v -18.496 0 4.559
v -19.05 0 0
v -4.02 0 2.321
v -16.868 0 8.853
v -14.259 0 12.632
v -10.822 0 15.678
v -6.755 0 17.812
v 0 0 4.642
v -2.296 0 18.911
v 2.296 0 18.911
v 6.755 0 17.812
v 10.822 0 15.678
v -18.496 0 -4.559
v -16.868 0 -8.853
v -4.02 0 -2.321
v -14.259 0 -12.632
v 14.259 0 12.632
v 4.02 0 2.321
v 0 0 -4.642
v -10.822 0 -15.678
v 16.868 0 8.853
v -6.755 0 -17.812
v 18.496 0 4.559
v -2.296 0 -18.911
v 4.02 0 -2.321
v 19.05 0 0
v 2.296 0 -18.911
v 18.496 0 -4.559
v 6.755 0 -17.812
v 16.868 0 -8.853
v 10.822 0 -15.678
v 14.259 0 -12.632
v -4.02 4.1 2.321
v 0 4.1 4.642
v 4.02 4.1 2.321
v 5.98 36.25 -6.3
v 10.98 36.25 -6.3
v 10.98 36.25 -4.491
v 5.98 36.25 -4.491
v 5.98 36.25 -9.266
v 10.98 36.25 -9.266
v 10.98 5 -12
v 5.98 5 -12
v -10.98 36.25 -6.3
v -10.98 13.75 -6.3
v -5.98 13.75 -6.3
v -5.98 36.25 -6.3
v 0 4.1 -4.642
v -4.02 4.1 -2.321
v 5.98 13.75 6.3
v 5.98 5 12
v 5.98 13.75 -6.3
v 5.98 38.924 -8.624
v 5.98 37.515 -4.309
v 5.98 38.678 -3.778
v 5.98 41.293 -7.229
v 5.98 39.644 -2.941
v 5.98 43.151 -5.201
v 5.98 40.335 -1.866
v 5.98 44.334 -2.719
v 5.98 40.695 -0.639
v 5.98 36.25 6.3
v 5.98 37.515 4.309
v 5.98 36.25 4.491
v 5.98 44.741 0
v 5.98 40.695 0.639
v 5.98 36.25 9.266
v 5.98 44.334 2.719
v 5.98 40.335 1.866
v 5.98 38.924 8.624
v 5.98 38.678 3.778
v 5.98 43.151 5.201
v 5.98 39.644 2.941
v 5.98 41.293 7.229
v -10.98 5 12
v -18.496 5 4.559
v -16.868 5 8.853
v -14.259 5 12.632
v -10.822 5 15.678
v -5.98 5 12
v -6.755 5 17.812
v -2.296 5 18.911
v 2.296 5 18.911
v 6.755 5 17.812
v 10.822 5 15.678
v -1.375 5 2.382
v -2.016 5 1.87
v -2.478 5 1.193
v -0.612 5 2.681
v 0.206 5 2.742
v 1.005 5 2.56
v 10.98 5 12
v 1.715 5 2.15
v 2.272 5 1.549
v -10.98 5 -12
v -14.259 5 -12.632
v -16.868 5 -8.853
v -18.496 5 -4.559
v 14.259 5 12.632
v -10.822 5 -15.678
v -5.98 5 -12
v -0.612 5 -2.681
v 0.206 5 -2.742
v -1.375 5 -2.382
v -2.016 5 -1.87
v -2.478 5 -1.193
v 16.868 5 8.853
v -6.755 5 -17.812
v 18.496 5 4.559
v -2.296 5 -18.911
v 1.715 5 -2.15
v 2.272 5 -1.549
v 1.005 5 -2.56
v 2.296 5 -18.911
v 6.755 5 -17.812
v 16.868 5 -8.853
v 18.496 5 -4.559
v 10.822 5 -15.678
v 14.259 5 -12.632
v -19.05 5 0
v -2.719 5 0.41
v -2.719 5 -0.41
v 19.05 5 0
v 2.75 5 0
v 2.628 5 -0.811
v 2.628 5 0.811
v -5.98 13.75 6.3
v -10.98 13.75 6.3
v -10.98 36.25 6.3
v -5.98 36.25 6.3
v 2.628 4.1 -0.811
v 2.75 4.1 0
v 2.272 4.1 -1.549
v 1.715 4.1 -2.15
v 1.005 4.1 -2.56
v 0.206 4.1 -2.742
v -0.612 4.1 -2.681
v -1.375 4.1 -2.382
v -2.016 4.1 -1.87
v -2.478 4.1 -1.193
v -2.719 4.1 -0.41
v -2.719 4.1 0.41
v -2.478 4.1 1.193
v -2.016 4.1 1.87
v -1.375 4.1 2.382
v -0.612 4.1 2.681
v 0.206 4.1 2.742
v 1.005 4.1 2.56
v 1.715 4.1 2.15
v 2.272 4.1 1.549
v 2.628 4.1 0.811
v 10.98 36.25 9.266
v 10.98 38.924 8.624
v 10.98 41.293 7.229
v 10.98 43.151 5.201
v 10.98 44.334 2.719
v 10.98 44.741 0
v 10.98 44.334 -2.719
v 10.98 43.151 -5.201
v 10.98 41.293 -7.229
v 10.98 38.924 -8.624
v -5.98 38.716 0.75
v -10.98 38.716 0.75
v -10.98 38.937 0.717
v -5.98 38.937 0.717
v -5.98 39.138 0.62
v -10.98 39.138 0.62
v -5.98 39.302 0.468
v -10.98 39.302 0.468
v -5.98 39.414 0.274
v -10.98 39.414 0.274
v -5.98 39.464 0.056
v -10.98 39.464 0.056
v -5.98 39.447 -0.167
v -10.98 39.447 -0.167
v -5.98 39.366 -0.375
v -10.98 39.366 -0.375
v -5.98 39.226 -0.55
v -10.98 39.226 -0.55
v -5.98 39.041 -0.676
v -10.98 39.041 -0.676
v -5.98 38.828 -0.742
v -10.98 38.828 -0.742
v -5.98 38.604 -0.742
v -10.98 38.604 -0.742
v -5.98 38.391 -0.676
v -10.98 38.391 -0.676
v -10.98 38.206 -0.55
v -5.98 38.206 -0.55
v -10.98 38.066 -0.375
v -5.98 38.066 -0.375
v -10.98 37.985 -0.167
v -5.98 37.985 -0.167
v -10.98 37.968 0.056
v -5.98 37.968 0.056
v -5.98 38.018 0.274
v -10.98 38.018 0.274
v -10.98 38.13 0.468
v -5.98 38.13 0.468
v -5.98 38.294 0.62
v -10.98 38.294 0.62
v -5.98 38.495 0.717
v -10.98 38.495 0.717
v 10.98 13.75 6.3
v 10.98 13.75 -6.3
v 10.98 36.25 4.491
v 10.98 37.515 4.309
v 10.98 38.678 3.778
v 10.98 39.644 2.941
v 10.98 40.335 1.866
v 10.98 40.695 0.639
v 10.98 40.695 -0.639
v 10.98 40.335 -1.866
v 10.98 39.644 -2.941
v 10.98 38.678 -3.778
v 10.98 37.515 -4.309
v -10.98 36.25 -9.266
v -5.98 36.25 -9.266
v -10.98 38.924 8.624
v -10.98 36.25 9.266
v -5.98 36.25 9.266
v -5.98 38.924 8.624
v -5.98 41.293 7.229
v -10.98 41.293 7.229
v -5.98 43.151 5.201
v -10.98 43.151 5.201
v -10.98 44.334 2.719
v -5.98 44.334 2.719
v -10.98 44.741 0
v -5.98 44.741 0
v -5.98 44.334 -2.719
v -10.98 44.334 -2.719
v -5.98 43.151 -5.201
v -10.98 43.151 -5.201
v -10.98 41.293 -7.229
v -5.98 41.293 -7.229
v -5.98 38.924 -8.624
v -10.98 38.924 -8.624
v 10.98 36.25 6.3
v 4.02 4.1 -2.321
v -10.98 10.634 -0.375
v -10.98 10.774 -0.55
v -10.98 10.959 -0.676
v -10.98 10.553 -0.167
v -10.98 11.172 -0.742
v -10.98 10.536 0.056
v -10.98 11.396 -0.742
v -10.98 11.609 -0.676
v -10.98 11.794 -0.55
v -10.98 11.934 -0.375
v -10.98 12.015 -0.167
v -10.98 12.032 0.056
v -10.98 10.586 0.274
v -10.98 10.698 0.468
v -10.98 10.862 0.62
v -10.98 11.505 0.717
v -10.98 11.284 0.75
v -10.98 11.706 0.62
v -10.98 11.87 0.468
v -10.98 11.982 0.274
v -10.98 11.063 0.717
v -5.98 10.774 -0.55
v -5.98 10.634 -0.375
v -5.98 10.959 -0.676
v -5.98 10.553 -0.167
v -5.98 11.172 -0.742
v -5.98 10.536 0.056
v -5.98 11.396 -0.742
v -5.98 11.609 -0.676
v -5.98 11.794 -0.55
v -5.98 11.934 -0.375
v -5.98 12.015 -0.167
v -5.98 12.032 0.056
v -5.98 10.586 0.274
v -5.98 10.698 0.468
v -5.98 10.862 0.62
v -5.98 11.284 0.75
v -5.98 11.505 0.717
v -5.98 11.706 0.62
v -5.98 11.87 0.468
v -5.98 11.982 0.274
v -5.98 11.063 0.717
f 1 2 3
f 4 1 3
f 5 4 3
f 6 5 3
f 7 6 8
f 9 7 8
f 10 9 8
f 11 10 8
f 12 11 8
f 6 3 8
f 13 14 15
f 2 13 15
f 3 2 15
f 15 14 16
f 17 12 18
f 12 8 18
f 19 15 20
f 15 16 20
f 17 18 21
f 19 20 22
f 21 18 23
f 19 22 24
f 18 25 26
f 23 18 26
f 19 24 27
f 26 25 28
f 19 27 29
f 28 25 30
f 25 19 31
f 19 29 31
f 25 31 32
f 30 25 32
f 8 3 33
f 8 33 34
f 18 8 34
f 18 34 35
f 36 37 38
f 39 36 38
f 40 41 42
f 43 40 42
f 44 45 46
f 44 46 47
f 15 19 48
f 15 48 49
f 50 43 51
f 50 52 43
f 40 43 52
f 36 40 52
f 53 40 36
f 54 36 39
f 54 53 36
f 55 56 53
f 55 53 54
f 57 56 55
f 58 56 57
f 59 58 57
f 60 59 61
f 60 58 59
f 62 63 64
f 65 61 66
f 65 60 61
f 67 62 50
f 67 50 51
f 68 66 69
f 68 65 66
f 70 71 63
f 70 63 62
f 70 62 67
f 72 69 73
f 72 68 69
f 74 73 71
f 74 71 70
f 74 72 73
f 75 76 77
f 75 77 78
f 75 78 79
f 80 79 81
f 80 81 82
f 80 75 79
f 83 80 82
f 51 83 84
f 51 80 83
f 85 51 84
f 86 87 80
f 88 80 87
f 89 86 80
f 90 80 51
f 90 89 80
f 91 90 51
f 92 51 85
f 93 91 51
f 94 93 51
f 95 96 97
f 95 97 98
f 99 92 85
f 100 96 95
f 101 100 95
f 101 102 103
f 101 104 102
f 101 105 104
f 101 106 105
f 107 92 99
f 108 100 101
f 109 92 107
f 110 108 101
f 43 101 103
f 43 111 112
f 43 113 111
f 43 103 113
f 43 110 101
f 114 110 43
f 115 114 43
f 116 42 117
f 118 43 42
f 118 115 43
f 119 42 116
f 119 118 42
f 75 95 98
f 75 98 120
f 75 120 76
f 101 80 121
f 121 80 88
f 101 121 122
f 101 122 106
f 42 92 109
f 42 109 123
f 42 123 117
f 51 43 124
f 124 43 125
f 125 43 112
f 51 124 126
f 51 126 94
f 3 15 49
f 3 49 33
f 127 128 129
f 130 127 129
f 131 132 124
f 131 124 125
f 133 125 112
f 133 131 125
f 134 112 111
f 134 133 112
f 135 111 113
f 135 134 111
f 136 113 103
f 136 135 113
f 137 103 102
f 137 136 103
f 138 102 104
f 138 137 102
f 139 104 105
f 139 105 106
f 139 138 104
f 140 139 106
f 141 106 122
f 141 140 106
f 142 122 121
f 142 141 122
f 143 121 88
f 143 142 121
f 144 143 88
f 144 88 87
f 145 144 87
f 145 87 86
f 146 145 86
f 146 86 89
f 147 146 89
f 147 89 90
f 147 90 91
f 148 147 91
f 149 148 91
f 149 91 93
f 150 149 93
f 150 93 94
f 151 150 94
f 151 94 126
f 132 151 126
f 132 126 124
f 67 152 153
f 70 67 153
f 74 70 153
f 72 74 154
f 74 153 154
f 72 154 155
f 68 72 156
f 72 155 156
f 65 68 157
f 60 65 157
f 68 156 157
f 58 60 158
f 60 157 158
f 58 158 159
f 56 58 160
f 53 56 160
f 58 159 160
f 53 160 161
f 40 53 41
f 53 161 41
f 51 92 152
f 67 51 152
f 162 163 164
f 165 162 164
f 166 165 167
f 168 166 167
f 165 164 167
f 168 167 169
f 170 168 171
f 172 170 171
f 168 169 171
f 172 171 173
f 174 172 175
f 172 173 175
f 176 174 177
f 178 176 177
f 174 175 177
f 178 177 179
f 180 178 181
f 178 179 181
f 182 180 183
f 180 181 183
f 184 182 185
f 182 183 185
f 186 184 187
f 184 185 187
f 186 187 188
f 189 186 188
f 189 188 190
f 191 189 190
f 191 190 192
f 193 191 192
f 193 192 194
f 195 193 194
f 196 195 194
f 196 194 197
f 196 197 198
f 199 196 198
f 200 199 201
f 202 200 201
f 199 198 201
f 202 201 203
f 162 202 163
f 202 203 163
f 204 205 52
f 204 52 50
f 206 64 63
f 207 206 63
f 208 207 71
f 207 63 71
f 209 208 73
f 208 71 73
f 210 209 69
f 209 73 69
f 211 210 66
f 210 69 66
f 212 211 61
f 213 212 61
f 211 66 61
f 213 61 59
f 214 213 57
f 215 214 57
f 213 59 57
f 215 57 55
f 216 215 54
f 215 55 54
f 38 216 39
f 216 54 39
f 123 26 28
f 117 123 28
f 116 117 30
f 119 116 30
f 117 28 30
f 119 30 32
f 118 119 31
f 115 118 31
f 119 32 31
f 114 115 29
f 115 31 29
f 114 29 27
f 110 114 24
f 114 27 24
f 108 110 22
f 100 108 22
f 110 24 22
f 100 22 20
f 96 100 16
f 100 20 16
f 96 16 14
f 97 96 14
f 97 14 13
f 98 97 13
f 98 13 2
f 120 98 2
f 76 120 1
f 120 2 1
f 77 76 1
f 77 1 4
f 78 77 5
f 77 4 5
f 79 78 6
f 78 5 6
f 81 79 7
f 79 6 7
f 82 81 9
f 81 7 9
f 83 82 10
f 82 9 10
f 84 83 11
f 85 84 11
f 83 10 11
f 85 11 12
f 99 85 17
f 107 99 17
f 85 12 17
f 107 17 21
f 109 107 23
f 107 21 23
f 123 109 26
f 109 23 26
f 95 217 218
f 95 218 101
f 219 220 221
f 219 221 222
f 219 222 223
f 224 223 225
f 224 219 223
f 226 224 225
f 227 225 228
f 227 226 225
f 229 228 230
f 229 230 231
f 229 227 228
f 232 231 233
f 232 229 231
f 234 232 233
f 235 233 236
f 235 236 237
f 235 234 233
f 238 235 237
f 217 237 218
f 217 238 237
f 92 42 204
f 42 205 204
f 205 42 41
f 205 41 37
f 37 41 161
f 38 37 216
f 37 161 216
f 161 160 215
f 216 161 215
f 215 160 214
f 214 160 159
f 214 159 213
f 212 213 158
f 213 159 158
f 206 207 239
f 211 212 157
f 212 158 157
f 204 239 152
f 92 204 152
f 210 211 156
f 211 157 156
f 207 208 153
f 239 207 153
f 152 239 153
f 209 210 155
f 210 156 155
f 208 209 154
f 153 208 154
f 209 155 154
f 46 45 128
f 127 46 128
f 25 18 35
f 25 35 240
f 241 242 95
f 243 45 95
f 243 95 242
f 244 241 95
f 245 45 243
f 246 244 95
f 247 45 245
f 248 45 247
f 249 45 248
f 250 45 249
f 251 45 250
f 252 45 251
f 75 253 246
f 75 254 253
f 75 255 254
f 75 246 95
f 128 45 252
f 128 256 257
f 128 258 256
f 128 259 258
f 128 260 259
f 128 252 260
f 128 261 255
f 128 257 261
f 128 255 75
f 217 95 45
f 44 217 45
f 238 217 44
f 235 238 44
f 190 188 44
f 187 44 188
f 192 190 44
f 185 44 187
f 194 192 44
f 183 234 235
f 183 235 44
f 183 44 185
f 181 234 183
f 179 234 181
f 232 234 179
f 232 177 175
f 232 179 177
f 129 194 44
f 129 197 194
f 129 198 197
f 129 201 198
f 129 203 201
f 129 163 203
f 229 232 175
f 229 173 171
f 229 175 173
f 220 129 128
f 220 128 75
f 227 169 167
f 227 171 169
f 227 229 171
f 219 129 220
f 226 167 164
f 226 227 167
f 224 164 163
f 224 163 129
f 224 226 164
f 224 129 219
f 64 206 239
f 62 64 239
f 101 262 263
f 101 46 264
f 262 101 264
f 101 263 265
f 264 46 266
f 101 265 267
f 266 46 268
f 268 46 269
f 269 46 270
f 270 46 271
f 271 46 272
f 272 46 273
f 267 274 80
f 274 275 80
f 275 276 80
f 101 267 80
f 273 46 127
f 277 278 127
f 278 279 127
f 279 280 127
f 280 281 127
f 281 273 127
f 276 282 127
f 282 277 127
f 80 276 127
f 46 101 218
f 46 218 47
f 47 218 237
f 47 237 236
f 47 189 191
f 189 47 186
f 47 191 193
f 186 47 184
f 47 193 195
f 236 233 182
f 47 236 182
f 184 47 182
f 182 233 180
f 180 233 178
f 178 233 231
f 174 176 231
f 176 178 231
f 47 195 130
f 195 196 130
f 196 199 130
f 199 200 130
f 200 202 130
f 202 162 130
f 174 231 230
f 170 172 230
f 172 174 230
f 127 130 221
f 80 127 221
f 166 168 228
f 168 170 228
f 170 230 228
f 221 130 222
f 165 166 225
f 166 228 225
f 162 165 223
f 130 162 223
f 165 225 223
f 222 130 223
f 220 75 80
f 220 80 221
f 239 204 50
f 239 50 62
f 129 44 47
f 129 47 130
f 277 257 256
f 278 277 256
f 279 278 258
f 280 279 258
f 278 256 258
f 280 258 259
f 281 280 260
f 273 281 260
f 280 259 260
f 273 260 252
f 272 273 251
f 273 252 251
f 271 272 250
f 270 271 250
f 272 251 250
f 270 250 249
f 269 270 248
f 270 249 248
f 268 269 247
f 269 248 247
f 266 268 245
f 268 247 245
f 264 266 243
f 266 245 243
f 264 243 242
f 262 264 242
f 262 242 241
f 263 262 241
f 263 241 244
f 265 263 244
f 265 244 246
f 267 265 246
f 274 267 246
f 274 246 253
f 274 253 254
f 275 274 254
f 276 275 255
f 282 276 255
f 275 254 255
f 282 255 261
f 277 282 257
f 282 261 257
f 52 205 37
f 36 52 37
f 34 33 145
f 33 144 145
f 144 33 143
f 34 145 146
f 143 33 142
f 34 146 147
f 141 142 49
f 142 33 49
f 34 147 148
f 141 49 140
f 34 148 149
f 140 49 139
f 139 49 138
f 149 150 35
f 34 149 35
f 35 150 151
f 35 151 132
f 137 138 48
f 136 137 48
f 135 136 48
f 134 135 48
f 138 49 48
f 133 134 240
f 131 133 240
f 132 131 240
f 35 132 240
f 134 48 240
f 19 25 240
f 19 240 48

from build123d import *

# Parameters (mm, degrees)
SKETCH1_R           = 19.05
SKETCH1_R_2         = 2.75
BOSS_EXTRUDE1_DEPTH = 5
CUT_EXTRUDE1_DEPTH  = 4.1
SKETCH5_W           = 12.6
SKETCH5_H           = 22.5
BOSS_EXTRUDE2_DEPTH = 5
SKETCH6_R           = 0.75
CUT_EXTRUDE2_DEPTH  = 5
CUT_EXTRUDE3_DEPTH  = 5


with BuildPart() as part:
    # Sketch1 → Boss-Extrude1 (new body)
    with BuildSketch(Plane(origin=(0, 0, 0), x_dir=(1, 0, 0), z_dir=(0, 1, 0))):
        Circle(SKETCH1_R)
        Circle(SKETCH1_R_2, mode=Mode.SUBTRACT)
    extrude(amount=BOSS_EXTRUDE1_DEPTH)

    # Sketch4 → Cut-Extrude1 (cut)
    with BuildSketch(Plane(origin=(0, 0, 0), x_dir=(1, 0, 0), z_dir=(0, 1, 0))):
        Polygon((0, 4.641896164), (-4.02, 2.320948082), (-4.02, -2.320948082), (0, -4.641896164), (4.02, -2.320948082), (4.02, 2.320948082), align=None)
    extrude(amount=CUT_EXTRUDE1_DEPTH, mode=Mode.SUBTRACT)

    # Sketch5 → Boss-Extrude2 (add)
    with BuildSketch(Plane.ZY.offset(10.98)):
        with BuildLine():
            Line((-12, 5), (12, 5))
            Line((12, 5), (9.265979265, 36.25))
            ThreePointArc((9.265979265, 36.25), (0, 44.740705658), (-9.265979265, 36.25))
            Line((-9.265979265, 36.25), (-12, 5))
        make_face()
        with Locations((0, 25)):
            Rectangle(SKETCH5_W, SKETCH5_H, mode=Mode.SUBTRACT)
    boss_extrude2 = extrude(amount=-BOSS_EXTRUDE2_DEPTH)

    # Mirror1: Boss-Extrude2 across plane
    add(boss_extrude2.mirror(Plane(origin=(0, 0, 0), x_dir=(0, 0, 1), z_dir=(1, 0, 0))))

    # Sketch6 → Cut-Extrude2 (cut)
    with BuildSketch(Plane.ZY.offset(10.98)):
        with Locations((0, 38.715999834)):
            Circle(SKETCH6_R)
        with Locations((0, 11.284000166)):
            Circle(SKETCH6_R)
    extrude(amount=-CUT_EXTRUDE2_DEPTH, mode=Mode.SUBTRACT)

    # Sketch7 → Cut-Extrude3 (cut)
    with BuildSketch(Plane.ZY.offset(-5.98)):
        with BuildLine():
            Line((-4.490705658, 36.25), (4.490705658, 36.25))
            ThreePointArc((4.490705658, 36.25), (0, 40.740705658), (-4.490705658, 36.25))
        make_face()
    extrude(amount=-CUT_EXTRUDE3_DEPTH, mode=Mode.SUBTRACT)


solid = part.part
